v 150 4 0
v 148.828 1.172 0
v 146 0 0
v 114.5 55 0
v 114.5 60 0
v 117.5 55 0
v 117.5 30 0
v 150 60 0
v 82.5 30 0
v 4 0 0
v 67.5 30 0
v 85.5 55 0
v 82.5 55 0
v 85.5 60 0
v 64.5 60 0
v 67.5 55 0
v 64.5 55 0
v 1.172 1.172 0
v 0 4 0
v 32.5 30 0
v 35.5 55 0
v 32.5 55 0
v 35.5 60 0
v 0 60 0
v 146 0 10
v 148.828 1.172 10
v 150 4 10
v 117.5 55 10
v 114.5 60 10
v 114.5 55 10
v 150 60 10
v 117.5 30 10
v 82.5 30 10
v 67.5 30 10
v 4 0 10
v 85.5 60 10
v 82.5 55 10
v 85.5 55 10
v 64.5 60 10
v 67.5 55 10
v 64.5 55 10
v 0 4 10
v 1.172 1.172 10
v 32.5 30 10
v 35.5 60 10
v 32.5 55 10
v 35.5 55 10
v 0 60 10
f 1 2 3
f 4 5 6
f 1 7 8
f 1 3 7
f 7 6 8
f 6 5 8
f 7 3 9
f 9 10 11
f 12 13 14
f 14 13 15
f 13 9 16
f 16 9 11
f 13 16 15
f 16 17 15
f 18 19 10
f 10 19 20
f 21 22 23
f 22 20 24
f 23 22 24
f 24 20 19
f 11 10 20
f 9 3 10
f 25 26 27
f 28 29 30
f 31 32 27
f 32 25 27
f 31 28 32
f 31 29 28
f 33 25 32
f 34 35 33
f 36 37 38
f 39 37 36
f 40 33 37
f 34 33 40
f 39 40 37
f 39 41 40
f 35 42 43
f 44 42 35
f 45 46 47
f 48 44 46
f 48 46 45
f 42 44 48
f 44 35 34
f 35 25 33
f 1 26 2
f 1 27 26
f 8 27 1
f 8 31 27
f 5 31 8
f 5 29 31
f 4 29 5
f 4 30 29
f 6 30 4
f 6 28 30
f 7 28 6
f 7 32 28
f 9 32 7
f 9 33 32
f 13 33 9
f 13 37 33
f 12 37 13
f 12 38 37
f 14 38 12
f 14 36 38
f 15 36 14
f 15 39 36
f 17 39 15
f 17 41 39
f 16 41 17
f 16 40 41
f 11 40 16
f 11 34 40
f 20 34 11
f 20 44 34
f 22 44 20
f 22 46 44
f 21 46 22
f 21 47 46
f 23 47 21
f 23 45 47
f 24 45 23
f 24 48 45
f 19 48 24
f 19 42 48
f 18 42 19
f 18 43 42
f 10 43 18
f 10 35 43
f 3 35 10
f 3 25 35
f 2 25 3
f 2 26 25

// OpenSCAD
$fn = 32;

// ----------------------------------------------------------------------
// Oversize slot bar: 150 mm bar with 2 oversize windows
// ----------------------------------------------------------------------

// --- parameters (mm) ---
profile_height = 10;      // extrusion height
profile_points = 24;      // points of the closed outline

profile = [[0, 4], [1.172, 1.172], [4, 0], [146, 0], [148.828, 1.172], [150, 4], [150, 60], [114.5, 60], [114.5, 55], [117.5, 55], [117.5, 30], [82.5, 30], [82.5, 55], [85.5, 55], [85.5, 60], [64.5, 60], [64.5, 55], [67.5, 55], [67.5, 30], [32.5, 30], [32.5, 55], [35.5, 55], [35.5, 60], [0, 60]];  // single closed polygon, 24 points, counter clockwise

// --- the one profile operation ---
linear_extrude(height = profile_height) polygon(points = profile);
